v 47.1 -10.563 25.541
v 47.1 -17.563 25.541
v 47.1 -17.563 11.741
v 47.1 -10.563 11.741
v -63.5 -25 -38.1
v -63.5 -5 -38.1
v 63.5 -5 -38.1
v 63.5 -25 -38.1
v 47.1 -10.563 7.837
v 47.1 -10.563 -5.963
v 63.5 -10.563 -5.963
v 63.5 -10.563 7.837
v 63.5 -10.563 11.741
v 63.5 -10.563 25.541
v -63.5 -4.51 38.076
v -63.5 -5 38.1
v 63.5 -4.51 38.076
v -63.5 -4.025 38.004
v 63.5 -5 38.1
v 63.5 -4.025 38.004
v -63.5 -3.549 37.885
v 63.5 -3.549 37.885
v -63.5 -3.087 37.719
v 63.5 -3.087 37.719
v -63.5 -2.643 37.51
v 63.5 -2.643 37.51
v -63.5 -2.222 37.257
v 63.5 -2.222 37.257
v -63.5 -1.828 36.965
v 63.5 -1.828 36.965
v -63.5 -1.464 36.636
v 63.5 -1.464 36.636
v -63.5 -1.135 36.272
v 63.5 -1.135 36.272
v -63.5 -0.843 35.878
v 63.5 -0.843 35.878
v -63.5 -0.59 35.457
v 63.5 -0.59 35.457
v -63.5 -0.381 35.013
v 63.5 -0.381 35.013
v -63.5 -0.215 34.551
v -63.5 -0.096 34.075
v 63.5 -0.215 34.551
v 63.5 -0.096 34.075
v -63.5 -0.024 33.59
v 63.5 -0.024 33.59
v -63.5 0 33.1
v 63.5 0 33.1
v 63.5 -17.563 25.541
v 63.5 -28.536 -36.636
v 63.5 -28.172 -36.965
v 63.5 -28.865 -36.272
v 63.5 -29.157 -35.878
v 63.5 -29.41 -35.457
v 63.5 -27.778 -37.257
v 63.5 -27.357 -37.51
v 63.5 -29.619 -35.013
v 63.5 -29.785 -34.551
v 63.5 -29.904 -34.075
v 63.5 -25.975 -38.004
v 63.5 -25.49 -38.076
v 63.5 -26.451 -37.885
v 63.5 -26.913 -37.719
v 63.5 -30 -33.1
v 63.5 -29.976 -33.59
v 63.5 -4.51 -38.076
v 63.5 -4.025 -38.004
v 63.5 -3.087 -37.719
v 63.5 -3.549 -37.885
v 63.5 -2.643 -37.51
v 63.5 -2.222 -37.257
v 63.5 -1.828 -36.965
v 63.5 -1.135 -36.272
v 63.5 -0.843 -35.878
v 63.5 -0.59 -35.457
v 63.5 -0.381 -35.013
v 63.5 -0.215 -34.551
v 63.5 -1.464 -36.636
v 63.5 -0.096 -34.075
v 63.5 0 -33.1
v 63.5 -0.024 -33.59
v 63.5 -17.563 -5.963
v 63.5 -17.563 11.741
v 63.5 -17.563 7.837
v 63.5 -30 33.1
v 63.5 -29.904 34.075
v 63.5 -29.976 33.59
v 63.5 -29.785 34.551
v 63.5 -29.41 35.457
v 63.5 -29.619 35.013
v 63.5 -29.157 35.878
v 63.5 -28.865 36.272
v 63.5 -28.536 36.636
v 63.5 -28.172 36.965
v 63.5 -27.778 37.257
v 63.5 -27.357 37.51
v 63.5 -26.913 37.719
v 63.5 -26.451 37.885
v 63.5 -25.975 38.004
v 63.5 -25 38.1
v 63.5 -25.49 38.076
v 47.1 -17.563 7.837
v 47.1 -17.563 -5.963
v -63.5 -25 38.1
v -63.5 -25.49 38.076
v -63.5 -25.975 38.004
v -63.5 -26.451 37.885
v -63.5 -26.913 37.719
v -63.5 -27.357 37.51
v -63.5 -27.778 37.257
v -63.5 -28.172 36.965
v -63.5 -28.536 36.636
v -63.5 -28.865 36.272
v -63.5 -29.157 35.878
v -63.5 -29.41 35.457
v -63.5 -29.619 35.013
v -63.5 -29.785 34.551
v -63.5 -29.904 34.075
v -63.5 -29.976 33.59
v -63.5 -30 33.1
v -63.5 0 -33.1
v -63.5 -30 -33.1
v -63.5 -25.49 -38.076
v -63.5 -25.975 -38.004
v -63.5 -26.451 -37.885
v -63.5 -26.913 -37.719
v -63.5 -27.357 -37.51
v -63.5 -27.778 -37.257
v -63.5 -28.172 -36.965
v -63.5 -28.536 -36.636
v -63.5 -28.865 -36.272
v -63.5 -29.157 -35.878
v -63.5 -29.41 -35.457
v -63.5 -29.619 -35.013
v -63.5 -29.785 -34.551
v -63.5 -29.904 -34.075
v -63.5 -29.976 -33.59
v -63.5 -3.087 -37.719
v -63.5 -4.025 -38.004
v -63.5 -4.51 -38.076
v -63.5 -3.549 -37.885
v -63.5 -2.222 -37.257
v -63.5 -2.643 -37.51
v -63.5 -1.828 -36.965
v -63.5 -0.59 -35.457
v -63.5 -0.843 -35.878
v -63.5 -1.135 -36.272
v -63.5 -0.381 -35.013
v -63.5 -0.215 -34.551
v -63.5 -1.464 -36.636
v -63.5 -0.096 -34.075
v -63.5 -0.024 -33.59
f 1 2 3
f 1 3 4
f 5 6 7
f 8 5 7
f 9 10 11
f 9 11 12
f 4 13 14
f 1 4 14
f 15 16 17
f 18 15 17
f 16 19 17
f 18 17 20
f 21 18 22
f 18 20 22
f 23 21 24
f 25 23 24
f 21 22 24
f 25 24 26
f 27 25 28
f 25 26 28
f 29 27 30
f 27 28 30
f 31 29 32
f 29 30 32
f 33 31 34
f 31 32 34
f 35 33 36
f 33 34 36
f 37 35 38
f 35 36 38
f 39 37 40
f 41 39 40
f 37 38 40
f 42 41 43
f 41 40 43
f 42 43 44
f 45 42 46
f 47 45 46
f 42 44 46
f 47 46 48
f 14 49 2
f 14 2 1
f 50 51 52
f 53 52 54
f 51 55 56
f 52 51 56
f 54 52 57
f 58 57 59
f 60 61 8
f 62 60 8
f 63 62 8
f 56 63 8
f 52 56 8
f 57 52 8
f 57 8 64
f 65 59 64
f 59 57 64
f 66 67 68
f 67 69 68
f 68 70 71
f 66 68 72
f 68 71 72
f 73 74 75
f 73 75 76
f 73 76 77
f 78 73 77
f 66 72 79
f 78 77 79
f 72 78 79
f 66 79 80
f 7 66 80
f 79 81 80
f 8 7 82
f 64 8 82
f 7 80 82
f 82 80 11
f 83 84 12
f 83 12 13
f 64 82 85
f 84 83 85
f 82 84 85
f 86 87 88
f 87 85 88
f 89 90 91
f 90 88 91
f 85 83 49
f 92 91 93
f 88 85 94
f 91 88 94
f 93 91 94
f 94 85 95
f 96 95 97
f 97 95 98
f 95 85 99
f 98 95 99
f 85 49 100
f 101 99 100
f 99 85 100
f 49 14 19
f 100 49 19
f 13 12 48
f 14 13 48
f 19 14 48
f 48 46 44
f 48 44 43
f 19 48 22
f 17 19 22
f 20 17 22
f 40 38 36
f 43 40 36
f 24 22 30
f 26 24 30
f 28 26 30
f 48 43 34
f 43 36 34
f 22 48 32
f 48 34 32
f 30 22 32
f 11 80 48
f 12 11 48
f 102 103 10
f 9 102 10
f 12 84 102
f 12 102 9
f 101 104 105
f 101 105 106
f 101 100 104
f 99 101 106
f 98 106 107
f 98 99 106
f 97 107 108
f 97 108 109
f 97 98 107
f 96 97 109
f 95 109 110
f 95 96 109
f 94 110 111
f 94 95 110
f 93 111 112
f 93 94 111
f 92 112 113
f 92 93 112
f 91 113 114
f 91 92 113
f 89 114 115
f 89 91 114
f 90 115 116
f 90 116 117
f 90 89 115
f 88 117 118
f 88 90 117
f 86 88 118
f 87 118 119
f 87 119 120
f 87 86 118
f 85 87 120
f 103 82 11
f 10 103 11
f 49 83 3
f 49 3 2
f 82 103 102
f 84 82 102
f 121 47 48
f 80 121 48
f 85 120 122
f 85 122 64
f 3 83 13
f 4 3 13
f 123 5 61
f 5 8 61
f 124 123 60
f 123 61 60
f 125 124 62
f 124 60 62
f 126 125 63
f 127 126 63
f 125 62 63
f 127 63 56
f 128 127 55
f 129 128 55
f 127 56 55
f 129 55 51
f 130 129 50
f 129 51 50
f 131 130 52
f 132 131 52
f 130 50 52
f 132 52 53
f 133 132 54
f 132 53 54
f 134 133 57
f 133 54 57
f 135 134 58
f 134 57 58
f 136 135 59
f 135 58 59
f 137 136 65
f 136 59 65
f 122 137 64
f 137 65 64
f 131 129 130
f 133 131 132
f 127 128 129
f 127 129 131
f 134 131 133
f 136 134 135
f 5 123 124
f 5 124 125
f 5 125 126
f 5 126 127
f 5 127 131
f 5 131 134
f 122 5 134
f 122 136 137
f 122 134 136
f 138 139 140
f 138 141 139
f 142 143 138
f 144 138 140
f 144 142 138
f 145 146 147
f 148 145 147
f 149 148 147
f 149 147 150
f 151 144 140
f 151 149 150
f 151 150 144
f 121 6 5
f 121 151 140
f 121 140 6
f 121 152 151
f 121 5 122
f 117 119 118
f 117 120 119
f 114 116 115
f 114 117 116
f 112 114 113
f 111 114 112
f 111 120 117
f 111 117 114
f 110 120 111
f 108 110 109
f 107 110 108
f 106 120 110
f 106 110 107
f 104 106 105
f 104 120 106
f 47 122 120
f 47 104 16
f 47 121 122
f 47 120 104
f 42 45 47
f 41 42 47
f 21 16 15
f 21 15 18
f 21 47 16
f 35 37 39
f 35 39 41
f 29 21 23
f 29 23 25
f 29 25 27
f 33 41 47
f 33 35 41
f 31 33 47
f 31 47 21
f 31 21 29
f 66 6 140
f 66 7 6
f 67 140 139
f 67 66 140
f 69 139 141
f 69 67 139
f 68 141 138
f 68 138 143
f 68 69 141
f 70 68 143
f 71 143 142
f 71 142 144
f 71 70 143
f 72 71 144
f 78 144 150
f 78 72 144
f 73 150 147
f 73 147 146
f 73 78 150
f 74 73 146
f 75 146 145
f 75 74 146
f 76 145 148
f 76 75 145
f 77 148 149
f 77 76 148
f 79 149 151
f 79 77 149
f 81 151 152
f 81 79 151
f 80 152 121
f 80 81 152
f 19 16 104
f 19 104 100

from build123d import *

# Parameters (mm, degrees)
F0_W     = 127
F0_H     = 76.2
F1_DEPTH = 30
F2_R     = 5
F3_W     = 7
F3_H     = 13.8
F4_DEPTH = 16.4
F5_W     = 7
F5_H     = 13.8
F6_DEPTH = 16.4


with BuildPart() as f1:
    # F0 (on Front) → F1 (new body)
    with BuildSketch(Plane.XZ):
        Rectangle(F0_W, F0_H)
    extrude(amount=F1_DEPTH)

    # F2
    f2_edges = [f1.edges().sort_by_distance(p)[0] for p in [
        (0, -30, 38.1),
        (0, 0, 38.1),
        (0, -30, -38.1),
        (0, 0, -38.1),
    ]]
    fillet(f2_edges, radius=F2_R)

    # F3 (on face) → F4 (cut)
    with BuildSketch(Plane.YZ.offset(63.5)):
        with Locations((-14.062501, 18.641072)):
            Rectangle(F3_W, F3_H)
    extrude(amount=-F4_DEPTH, mode=Mode.SUBTRACT)

    # F5 (on face) → F6 (cut)
    with BuildSketch(Plane.YZ.offset(63.5)):
        with Locations((-14.062501, 0.937244)):
            Rectangle(F5_W, F5_H)
    extrude(amount=-F6_DEPTH, mode=Mode.SUBTRACT)


solid = f1.part
